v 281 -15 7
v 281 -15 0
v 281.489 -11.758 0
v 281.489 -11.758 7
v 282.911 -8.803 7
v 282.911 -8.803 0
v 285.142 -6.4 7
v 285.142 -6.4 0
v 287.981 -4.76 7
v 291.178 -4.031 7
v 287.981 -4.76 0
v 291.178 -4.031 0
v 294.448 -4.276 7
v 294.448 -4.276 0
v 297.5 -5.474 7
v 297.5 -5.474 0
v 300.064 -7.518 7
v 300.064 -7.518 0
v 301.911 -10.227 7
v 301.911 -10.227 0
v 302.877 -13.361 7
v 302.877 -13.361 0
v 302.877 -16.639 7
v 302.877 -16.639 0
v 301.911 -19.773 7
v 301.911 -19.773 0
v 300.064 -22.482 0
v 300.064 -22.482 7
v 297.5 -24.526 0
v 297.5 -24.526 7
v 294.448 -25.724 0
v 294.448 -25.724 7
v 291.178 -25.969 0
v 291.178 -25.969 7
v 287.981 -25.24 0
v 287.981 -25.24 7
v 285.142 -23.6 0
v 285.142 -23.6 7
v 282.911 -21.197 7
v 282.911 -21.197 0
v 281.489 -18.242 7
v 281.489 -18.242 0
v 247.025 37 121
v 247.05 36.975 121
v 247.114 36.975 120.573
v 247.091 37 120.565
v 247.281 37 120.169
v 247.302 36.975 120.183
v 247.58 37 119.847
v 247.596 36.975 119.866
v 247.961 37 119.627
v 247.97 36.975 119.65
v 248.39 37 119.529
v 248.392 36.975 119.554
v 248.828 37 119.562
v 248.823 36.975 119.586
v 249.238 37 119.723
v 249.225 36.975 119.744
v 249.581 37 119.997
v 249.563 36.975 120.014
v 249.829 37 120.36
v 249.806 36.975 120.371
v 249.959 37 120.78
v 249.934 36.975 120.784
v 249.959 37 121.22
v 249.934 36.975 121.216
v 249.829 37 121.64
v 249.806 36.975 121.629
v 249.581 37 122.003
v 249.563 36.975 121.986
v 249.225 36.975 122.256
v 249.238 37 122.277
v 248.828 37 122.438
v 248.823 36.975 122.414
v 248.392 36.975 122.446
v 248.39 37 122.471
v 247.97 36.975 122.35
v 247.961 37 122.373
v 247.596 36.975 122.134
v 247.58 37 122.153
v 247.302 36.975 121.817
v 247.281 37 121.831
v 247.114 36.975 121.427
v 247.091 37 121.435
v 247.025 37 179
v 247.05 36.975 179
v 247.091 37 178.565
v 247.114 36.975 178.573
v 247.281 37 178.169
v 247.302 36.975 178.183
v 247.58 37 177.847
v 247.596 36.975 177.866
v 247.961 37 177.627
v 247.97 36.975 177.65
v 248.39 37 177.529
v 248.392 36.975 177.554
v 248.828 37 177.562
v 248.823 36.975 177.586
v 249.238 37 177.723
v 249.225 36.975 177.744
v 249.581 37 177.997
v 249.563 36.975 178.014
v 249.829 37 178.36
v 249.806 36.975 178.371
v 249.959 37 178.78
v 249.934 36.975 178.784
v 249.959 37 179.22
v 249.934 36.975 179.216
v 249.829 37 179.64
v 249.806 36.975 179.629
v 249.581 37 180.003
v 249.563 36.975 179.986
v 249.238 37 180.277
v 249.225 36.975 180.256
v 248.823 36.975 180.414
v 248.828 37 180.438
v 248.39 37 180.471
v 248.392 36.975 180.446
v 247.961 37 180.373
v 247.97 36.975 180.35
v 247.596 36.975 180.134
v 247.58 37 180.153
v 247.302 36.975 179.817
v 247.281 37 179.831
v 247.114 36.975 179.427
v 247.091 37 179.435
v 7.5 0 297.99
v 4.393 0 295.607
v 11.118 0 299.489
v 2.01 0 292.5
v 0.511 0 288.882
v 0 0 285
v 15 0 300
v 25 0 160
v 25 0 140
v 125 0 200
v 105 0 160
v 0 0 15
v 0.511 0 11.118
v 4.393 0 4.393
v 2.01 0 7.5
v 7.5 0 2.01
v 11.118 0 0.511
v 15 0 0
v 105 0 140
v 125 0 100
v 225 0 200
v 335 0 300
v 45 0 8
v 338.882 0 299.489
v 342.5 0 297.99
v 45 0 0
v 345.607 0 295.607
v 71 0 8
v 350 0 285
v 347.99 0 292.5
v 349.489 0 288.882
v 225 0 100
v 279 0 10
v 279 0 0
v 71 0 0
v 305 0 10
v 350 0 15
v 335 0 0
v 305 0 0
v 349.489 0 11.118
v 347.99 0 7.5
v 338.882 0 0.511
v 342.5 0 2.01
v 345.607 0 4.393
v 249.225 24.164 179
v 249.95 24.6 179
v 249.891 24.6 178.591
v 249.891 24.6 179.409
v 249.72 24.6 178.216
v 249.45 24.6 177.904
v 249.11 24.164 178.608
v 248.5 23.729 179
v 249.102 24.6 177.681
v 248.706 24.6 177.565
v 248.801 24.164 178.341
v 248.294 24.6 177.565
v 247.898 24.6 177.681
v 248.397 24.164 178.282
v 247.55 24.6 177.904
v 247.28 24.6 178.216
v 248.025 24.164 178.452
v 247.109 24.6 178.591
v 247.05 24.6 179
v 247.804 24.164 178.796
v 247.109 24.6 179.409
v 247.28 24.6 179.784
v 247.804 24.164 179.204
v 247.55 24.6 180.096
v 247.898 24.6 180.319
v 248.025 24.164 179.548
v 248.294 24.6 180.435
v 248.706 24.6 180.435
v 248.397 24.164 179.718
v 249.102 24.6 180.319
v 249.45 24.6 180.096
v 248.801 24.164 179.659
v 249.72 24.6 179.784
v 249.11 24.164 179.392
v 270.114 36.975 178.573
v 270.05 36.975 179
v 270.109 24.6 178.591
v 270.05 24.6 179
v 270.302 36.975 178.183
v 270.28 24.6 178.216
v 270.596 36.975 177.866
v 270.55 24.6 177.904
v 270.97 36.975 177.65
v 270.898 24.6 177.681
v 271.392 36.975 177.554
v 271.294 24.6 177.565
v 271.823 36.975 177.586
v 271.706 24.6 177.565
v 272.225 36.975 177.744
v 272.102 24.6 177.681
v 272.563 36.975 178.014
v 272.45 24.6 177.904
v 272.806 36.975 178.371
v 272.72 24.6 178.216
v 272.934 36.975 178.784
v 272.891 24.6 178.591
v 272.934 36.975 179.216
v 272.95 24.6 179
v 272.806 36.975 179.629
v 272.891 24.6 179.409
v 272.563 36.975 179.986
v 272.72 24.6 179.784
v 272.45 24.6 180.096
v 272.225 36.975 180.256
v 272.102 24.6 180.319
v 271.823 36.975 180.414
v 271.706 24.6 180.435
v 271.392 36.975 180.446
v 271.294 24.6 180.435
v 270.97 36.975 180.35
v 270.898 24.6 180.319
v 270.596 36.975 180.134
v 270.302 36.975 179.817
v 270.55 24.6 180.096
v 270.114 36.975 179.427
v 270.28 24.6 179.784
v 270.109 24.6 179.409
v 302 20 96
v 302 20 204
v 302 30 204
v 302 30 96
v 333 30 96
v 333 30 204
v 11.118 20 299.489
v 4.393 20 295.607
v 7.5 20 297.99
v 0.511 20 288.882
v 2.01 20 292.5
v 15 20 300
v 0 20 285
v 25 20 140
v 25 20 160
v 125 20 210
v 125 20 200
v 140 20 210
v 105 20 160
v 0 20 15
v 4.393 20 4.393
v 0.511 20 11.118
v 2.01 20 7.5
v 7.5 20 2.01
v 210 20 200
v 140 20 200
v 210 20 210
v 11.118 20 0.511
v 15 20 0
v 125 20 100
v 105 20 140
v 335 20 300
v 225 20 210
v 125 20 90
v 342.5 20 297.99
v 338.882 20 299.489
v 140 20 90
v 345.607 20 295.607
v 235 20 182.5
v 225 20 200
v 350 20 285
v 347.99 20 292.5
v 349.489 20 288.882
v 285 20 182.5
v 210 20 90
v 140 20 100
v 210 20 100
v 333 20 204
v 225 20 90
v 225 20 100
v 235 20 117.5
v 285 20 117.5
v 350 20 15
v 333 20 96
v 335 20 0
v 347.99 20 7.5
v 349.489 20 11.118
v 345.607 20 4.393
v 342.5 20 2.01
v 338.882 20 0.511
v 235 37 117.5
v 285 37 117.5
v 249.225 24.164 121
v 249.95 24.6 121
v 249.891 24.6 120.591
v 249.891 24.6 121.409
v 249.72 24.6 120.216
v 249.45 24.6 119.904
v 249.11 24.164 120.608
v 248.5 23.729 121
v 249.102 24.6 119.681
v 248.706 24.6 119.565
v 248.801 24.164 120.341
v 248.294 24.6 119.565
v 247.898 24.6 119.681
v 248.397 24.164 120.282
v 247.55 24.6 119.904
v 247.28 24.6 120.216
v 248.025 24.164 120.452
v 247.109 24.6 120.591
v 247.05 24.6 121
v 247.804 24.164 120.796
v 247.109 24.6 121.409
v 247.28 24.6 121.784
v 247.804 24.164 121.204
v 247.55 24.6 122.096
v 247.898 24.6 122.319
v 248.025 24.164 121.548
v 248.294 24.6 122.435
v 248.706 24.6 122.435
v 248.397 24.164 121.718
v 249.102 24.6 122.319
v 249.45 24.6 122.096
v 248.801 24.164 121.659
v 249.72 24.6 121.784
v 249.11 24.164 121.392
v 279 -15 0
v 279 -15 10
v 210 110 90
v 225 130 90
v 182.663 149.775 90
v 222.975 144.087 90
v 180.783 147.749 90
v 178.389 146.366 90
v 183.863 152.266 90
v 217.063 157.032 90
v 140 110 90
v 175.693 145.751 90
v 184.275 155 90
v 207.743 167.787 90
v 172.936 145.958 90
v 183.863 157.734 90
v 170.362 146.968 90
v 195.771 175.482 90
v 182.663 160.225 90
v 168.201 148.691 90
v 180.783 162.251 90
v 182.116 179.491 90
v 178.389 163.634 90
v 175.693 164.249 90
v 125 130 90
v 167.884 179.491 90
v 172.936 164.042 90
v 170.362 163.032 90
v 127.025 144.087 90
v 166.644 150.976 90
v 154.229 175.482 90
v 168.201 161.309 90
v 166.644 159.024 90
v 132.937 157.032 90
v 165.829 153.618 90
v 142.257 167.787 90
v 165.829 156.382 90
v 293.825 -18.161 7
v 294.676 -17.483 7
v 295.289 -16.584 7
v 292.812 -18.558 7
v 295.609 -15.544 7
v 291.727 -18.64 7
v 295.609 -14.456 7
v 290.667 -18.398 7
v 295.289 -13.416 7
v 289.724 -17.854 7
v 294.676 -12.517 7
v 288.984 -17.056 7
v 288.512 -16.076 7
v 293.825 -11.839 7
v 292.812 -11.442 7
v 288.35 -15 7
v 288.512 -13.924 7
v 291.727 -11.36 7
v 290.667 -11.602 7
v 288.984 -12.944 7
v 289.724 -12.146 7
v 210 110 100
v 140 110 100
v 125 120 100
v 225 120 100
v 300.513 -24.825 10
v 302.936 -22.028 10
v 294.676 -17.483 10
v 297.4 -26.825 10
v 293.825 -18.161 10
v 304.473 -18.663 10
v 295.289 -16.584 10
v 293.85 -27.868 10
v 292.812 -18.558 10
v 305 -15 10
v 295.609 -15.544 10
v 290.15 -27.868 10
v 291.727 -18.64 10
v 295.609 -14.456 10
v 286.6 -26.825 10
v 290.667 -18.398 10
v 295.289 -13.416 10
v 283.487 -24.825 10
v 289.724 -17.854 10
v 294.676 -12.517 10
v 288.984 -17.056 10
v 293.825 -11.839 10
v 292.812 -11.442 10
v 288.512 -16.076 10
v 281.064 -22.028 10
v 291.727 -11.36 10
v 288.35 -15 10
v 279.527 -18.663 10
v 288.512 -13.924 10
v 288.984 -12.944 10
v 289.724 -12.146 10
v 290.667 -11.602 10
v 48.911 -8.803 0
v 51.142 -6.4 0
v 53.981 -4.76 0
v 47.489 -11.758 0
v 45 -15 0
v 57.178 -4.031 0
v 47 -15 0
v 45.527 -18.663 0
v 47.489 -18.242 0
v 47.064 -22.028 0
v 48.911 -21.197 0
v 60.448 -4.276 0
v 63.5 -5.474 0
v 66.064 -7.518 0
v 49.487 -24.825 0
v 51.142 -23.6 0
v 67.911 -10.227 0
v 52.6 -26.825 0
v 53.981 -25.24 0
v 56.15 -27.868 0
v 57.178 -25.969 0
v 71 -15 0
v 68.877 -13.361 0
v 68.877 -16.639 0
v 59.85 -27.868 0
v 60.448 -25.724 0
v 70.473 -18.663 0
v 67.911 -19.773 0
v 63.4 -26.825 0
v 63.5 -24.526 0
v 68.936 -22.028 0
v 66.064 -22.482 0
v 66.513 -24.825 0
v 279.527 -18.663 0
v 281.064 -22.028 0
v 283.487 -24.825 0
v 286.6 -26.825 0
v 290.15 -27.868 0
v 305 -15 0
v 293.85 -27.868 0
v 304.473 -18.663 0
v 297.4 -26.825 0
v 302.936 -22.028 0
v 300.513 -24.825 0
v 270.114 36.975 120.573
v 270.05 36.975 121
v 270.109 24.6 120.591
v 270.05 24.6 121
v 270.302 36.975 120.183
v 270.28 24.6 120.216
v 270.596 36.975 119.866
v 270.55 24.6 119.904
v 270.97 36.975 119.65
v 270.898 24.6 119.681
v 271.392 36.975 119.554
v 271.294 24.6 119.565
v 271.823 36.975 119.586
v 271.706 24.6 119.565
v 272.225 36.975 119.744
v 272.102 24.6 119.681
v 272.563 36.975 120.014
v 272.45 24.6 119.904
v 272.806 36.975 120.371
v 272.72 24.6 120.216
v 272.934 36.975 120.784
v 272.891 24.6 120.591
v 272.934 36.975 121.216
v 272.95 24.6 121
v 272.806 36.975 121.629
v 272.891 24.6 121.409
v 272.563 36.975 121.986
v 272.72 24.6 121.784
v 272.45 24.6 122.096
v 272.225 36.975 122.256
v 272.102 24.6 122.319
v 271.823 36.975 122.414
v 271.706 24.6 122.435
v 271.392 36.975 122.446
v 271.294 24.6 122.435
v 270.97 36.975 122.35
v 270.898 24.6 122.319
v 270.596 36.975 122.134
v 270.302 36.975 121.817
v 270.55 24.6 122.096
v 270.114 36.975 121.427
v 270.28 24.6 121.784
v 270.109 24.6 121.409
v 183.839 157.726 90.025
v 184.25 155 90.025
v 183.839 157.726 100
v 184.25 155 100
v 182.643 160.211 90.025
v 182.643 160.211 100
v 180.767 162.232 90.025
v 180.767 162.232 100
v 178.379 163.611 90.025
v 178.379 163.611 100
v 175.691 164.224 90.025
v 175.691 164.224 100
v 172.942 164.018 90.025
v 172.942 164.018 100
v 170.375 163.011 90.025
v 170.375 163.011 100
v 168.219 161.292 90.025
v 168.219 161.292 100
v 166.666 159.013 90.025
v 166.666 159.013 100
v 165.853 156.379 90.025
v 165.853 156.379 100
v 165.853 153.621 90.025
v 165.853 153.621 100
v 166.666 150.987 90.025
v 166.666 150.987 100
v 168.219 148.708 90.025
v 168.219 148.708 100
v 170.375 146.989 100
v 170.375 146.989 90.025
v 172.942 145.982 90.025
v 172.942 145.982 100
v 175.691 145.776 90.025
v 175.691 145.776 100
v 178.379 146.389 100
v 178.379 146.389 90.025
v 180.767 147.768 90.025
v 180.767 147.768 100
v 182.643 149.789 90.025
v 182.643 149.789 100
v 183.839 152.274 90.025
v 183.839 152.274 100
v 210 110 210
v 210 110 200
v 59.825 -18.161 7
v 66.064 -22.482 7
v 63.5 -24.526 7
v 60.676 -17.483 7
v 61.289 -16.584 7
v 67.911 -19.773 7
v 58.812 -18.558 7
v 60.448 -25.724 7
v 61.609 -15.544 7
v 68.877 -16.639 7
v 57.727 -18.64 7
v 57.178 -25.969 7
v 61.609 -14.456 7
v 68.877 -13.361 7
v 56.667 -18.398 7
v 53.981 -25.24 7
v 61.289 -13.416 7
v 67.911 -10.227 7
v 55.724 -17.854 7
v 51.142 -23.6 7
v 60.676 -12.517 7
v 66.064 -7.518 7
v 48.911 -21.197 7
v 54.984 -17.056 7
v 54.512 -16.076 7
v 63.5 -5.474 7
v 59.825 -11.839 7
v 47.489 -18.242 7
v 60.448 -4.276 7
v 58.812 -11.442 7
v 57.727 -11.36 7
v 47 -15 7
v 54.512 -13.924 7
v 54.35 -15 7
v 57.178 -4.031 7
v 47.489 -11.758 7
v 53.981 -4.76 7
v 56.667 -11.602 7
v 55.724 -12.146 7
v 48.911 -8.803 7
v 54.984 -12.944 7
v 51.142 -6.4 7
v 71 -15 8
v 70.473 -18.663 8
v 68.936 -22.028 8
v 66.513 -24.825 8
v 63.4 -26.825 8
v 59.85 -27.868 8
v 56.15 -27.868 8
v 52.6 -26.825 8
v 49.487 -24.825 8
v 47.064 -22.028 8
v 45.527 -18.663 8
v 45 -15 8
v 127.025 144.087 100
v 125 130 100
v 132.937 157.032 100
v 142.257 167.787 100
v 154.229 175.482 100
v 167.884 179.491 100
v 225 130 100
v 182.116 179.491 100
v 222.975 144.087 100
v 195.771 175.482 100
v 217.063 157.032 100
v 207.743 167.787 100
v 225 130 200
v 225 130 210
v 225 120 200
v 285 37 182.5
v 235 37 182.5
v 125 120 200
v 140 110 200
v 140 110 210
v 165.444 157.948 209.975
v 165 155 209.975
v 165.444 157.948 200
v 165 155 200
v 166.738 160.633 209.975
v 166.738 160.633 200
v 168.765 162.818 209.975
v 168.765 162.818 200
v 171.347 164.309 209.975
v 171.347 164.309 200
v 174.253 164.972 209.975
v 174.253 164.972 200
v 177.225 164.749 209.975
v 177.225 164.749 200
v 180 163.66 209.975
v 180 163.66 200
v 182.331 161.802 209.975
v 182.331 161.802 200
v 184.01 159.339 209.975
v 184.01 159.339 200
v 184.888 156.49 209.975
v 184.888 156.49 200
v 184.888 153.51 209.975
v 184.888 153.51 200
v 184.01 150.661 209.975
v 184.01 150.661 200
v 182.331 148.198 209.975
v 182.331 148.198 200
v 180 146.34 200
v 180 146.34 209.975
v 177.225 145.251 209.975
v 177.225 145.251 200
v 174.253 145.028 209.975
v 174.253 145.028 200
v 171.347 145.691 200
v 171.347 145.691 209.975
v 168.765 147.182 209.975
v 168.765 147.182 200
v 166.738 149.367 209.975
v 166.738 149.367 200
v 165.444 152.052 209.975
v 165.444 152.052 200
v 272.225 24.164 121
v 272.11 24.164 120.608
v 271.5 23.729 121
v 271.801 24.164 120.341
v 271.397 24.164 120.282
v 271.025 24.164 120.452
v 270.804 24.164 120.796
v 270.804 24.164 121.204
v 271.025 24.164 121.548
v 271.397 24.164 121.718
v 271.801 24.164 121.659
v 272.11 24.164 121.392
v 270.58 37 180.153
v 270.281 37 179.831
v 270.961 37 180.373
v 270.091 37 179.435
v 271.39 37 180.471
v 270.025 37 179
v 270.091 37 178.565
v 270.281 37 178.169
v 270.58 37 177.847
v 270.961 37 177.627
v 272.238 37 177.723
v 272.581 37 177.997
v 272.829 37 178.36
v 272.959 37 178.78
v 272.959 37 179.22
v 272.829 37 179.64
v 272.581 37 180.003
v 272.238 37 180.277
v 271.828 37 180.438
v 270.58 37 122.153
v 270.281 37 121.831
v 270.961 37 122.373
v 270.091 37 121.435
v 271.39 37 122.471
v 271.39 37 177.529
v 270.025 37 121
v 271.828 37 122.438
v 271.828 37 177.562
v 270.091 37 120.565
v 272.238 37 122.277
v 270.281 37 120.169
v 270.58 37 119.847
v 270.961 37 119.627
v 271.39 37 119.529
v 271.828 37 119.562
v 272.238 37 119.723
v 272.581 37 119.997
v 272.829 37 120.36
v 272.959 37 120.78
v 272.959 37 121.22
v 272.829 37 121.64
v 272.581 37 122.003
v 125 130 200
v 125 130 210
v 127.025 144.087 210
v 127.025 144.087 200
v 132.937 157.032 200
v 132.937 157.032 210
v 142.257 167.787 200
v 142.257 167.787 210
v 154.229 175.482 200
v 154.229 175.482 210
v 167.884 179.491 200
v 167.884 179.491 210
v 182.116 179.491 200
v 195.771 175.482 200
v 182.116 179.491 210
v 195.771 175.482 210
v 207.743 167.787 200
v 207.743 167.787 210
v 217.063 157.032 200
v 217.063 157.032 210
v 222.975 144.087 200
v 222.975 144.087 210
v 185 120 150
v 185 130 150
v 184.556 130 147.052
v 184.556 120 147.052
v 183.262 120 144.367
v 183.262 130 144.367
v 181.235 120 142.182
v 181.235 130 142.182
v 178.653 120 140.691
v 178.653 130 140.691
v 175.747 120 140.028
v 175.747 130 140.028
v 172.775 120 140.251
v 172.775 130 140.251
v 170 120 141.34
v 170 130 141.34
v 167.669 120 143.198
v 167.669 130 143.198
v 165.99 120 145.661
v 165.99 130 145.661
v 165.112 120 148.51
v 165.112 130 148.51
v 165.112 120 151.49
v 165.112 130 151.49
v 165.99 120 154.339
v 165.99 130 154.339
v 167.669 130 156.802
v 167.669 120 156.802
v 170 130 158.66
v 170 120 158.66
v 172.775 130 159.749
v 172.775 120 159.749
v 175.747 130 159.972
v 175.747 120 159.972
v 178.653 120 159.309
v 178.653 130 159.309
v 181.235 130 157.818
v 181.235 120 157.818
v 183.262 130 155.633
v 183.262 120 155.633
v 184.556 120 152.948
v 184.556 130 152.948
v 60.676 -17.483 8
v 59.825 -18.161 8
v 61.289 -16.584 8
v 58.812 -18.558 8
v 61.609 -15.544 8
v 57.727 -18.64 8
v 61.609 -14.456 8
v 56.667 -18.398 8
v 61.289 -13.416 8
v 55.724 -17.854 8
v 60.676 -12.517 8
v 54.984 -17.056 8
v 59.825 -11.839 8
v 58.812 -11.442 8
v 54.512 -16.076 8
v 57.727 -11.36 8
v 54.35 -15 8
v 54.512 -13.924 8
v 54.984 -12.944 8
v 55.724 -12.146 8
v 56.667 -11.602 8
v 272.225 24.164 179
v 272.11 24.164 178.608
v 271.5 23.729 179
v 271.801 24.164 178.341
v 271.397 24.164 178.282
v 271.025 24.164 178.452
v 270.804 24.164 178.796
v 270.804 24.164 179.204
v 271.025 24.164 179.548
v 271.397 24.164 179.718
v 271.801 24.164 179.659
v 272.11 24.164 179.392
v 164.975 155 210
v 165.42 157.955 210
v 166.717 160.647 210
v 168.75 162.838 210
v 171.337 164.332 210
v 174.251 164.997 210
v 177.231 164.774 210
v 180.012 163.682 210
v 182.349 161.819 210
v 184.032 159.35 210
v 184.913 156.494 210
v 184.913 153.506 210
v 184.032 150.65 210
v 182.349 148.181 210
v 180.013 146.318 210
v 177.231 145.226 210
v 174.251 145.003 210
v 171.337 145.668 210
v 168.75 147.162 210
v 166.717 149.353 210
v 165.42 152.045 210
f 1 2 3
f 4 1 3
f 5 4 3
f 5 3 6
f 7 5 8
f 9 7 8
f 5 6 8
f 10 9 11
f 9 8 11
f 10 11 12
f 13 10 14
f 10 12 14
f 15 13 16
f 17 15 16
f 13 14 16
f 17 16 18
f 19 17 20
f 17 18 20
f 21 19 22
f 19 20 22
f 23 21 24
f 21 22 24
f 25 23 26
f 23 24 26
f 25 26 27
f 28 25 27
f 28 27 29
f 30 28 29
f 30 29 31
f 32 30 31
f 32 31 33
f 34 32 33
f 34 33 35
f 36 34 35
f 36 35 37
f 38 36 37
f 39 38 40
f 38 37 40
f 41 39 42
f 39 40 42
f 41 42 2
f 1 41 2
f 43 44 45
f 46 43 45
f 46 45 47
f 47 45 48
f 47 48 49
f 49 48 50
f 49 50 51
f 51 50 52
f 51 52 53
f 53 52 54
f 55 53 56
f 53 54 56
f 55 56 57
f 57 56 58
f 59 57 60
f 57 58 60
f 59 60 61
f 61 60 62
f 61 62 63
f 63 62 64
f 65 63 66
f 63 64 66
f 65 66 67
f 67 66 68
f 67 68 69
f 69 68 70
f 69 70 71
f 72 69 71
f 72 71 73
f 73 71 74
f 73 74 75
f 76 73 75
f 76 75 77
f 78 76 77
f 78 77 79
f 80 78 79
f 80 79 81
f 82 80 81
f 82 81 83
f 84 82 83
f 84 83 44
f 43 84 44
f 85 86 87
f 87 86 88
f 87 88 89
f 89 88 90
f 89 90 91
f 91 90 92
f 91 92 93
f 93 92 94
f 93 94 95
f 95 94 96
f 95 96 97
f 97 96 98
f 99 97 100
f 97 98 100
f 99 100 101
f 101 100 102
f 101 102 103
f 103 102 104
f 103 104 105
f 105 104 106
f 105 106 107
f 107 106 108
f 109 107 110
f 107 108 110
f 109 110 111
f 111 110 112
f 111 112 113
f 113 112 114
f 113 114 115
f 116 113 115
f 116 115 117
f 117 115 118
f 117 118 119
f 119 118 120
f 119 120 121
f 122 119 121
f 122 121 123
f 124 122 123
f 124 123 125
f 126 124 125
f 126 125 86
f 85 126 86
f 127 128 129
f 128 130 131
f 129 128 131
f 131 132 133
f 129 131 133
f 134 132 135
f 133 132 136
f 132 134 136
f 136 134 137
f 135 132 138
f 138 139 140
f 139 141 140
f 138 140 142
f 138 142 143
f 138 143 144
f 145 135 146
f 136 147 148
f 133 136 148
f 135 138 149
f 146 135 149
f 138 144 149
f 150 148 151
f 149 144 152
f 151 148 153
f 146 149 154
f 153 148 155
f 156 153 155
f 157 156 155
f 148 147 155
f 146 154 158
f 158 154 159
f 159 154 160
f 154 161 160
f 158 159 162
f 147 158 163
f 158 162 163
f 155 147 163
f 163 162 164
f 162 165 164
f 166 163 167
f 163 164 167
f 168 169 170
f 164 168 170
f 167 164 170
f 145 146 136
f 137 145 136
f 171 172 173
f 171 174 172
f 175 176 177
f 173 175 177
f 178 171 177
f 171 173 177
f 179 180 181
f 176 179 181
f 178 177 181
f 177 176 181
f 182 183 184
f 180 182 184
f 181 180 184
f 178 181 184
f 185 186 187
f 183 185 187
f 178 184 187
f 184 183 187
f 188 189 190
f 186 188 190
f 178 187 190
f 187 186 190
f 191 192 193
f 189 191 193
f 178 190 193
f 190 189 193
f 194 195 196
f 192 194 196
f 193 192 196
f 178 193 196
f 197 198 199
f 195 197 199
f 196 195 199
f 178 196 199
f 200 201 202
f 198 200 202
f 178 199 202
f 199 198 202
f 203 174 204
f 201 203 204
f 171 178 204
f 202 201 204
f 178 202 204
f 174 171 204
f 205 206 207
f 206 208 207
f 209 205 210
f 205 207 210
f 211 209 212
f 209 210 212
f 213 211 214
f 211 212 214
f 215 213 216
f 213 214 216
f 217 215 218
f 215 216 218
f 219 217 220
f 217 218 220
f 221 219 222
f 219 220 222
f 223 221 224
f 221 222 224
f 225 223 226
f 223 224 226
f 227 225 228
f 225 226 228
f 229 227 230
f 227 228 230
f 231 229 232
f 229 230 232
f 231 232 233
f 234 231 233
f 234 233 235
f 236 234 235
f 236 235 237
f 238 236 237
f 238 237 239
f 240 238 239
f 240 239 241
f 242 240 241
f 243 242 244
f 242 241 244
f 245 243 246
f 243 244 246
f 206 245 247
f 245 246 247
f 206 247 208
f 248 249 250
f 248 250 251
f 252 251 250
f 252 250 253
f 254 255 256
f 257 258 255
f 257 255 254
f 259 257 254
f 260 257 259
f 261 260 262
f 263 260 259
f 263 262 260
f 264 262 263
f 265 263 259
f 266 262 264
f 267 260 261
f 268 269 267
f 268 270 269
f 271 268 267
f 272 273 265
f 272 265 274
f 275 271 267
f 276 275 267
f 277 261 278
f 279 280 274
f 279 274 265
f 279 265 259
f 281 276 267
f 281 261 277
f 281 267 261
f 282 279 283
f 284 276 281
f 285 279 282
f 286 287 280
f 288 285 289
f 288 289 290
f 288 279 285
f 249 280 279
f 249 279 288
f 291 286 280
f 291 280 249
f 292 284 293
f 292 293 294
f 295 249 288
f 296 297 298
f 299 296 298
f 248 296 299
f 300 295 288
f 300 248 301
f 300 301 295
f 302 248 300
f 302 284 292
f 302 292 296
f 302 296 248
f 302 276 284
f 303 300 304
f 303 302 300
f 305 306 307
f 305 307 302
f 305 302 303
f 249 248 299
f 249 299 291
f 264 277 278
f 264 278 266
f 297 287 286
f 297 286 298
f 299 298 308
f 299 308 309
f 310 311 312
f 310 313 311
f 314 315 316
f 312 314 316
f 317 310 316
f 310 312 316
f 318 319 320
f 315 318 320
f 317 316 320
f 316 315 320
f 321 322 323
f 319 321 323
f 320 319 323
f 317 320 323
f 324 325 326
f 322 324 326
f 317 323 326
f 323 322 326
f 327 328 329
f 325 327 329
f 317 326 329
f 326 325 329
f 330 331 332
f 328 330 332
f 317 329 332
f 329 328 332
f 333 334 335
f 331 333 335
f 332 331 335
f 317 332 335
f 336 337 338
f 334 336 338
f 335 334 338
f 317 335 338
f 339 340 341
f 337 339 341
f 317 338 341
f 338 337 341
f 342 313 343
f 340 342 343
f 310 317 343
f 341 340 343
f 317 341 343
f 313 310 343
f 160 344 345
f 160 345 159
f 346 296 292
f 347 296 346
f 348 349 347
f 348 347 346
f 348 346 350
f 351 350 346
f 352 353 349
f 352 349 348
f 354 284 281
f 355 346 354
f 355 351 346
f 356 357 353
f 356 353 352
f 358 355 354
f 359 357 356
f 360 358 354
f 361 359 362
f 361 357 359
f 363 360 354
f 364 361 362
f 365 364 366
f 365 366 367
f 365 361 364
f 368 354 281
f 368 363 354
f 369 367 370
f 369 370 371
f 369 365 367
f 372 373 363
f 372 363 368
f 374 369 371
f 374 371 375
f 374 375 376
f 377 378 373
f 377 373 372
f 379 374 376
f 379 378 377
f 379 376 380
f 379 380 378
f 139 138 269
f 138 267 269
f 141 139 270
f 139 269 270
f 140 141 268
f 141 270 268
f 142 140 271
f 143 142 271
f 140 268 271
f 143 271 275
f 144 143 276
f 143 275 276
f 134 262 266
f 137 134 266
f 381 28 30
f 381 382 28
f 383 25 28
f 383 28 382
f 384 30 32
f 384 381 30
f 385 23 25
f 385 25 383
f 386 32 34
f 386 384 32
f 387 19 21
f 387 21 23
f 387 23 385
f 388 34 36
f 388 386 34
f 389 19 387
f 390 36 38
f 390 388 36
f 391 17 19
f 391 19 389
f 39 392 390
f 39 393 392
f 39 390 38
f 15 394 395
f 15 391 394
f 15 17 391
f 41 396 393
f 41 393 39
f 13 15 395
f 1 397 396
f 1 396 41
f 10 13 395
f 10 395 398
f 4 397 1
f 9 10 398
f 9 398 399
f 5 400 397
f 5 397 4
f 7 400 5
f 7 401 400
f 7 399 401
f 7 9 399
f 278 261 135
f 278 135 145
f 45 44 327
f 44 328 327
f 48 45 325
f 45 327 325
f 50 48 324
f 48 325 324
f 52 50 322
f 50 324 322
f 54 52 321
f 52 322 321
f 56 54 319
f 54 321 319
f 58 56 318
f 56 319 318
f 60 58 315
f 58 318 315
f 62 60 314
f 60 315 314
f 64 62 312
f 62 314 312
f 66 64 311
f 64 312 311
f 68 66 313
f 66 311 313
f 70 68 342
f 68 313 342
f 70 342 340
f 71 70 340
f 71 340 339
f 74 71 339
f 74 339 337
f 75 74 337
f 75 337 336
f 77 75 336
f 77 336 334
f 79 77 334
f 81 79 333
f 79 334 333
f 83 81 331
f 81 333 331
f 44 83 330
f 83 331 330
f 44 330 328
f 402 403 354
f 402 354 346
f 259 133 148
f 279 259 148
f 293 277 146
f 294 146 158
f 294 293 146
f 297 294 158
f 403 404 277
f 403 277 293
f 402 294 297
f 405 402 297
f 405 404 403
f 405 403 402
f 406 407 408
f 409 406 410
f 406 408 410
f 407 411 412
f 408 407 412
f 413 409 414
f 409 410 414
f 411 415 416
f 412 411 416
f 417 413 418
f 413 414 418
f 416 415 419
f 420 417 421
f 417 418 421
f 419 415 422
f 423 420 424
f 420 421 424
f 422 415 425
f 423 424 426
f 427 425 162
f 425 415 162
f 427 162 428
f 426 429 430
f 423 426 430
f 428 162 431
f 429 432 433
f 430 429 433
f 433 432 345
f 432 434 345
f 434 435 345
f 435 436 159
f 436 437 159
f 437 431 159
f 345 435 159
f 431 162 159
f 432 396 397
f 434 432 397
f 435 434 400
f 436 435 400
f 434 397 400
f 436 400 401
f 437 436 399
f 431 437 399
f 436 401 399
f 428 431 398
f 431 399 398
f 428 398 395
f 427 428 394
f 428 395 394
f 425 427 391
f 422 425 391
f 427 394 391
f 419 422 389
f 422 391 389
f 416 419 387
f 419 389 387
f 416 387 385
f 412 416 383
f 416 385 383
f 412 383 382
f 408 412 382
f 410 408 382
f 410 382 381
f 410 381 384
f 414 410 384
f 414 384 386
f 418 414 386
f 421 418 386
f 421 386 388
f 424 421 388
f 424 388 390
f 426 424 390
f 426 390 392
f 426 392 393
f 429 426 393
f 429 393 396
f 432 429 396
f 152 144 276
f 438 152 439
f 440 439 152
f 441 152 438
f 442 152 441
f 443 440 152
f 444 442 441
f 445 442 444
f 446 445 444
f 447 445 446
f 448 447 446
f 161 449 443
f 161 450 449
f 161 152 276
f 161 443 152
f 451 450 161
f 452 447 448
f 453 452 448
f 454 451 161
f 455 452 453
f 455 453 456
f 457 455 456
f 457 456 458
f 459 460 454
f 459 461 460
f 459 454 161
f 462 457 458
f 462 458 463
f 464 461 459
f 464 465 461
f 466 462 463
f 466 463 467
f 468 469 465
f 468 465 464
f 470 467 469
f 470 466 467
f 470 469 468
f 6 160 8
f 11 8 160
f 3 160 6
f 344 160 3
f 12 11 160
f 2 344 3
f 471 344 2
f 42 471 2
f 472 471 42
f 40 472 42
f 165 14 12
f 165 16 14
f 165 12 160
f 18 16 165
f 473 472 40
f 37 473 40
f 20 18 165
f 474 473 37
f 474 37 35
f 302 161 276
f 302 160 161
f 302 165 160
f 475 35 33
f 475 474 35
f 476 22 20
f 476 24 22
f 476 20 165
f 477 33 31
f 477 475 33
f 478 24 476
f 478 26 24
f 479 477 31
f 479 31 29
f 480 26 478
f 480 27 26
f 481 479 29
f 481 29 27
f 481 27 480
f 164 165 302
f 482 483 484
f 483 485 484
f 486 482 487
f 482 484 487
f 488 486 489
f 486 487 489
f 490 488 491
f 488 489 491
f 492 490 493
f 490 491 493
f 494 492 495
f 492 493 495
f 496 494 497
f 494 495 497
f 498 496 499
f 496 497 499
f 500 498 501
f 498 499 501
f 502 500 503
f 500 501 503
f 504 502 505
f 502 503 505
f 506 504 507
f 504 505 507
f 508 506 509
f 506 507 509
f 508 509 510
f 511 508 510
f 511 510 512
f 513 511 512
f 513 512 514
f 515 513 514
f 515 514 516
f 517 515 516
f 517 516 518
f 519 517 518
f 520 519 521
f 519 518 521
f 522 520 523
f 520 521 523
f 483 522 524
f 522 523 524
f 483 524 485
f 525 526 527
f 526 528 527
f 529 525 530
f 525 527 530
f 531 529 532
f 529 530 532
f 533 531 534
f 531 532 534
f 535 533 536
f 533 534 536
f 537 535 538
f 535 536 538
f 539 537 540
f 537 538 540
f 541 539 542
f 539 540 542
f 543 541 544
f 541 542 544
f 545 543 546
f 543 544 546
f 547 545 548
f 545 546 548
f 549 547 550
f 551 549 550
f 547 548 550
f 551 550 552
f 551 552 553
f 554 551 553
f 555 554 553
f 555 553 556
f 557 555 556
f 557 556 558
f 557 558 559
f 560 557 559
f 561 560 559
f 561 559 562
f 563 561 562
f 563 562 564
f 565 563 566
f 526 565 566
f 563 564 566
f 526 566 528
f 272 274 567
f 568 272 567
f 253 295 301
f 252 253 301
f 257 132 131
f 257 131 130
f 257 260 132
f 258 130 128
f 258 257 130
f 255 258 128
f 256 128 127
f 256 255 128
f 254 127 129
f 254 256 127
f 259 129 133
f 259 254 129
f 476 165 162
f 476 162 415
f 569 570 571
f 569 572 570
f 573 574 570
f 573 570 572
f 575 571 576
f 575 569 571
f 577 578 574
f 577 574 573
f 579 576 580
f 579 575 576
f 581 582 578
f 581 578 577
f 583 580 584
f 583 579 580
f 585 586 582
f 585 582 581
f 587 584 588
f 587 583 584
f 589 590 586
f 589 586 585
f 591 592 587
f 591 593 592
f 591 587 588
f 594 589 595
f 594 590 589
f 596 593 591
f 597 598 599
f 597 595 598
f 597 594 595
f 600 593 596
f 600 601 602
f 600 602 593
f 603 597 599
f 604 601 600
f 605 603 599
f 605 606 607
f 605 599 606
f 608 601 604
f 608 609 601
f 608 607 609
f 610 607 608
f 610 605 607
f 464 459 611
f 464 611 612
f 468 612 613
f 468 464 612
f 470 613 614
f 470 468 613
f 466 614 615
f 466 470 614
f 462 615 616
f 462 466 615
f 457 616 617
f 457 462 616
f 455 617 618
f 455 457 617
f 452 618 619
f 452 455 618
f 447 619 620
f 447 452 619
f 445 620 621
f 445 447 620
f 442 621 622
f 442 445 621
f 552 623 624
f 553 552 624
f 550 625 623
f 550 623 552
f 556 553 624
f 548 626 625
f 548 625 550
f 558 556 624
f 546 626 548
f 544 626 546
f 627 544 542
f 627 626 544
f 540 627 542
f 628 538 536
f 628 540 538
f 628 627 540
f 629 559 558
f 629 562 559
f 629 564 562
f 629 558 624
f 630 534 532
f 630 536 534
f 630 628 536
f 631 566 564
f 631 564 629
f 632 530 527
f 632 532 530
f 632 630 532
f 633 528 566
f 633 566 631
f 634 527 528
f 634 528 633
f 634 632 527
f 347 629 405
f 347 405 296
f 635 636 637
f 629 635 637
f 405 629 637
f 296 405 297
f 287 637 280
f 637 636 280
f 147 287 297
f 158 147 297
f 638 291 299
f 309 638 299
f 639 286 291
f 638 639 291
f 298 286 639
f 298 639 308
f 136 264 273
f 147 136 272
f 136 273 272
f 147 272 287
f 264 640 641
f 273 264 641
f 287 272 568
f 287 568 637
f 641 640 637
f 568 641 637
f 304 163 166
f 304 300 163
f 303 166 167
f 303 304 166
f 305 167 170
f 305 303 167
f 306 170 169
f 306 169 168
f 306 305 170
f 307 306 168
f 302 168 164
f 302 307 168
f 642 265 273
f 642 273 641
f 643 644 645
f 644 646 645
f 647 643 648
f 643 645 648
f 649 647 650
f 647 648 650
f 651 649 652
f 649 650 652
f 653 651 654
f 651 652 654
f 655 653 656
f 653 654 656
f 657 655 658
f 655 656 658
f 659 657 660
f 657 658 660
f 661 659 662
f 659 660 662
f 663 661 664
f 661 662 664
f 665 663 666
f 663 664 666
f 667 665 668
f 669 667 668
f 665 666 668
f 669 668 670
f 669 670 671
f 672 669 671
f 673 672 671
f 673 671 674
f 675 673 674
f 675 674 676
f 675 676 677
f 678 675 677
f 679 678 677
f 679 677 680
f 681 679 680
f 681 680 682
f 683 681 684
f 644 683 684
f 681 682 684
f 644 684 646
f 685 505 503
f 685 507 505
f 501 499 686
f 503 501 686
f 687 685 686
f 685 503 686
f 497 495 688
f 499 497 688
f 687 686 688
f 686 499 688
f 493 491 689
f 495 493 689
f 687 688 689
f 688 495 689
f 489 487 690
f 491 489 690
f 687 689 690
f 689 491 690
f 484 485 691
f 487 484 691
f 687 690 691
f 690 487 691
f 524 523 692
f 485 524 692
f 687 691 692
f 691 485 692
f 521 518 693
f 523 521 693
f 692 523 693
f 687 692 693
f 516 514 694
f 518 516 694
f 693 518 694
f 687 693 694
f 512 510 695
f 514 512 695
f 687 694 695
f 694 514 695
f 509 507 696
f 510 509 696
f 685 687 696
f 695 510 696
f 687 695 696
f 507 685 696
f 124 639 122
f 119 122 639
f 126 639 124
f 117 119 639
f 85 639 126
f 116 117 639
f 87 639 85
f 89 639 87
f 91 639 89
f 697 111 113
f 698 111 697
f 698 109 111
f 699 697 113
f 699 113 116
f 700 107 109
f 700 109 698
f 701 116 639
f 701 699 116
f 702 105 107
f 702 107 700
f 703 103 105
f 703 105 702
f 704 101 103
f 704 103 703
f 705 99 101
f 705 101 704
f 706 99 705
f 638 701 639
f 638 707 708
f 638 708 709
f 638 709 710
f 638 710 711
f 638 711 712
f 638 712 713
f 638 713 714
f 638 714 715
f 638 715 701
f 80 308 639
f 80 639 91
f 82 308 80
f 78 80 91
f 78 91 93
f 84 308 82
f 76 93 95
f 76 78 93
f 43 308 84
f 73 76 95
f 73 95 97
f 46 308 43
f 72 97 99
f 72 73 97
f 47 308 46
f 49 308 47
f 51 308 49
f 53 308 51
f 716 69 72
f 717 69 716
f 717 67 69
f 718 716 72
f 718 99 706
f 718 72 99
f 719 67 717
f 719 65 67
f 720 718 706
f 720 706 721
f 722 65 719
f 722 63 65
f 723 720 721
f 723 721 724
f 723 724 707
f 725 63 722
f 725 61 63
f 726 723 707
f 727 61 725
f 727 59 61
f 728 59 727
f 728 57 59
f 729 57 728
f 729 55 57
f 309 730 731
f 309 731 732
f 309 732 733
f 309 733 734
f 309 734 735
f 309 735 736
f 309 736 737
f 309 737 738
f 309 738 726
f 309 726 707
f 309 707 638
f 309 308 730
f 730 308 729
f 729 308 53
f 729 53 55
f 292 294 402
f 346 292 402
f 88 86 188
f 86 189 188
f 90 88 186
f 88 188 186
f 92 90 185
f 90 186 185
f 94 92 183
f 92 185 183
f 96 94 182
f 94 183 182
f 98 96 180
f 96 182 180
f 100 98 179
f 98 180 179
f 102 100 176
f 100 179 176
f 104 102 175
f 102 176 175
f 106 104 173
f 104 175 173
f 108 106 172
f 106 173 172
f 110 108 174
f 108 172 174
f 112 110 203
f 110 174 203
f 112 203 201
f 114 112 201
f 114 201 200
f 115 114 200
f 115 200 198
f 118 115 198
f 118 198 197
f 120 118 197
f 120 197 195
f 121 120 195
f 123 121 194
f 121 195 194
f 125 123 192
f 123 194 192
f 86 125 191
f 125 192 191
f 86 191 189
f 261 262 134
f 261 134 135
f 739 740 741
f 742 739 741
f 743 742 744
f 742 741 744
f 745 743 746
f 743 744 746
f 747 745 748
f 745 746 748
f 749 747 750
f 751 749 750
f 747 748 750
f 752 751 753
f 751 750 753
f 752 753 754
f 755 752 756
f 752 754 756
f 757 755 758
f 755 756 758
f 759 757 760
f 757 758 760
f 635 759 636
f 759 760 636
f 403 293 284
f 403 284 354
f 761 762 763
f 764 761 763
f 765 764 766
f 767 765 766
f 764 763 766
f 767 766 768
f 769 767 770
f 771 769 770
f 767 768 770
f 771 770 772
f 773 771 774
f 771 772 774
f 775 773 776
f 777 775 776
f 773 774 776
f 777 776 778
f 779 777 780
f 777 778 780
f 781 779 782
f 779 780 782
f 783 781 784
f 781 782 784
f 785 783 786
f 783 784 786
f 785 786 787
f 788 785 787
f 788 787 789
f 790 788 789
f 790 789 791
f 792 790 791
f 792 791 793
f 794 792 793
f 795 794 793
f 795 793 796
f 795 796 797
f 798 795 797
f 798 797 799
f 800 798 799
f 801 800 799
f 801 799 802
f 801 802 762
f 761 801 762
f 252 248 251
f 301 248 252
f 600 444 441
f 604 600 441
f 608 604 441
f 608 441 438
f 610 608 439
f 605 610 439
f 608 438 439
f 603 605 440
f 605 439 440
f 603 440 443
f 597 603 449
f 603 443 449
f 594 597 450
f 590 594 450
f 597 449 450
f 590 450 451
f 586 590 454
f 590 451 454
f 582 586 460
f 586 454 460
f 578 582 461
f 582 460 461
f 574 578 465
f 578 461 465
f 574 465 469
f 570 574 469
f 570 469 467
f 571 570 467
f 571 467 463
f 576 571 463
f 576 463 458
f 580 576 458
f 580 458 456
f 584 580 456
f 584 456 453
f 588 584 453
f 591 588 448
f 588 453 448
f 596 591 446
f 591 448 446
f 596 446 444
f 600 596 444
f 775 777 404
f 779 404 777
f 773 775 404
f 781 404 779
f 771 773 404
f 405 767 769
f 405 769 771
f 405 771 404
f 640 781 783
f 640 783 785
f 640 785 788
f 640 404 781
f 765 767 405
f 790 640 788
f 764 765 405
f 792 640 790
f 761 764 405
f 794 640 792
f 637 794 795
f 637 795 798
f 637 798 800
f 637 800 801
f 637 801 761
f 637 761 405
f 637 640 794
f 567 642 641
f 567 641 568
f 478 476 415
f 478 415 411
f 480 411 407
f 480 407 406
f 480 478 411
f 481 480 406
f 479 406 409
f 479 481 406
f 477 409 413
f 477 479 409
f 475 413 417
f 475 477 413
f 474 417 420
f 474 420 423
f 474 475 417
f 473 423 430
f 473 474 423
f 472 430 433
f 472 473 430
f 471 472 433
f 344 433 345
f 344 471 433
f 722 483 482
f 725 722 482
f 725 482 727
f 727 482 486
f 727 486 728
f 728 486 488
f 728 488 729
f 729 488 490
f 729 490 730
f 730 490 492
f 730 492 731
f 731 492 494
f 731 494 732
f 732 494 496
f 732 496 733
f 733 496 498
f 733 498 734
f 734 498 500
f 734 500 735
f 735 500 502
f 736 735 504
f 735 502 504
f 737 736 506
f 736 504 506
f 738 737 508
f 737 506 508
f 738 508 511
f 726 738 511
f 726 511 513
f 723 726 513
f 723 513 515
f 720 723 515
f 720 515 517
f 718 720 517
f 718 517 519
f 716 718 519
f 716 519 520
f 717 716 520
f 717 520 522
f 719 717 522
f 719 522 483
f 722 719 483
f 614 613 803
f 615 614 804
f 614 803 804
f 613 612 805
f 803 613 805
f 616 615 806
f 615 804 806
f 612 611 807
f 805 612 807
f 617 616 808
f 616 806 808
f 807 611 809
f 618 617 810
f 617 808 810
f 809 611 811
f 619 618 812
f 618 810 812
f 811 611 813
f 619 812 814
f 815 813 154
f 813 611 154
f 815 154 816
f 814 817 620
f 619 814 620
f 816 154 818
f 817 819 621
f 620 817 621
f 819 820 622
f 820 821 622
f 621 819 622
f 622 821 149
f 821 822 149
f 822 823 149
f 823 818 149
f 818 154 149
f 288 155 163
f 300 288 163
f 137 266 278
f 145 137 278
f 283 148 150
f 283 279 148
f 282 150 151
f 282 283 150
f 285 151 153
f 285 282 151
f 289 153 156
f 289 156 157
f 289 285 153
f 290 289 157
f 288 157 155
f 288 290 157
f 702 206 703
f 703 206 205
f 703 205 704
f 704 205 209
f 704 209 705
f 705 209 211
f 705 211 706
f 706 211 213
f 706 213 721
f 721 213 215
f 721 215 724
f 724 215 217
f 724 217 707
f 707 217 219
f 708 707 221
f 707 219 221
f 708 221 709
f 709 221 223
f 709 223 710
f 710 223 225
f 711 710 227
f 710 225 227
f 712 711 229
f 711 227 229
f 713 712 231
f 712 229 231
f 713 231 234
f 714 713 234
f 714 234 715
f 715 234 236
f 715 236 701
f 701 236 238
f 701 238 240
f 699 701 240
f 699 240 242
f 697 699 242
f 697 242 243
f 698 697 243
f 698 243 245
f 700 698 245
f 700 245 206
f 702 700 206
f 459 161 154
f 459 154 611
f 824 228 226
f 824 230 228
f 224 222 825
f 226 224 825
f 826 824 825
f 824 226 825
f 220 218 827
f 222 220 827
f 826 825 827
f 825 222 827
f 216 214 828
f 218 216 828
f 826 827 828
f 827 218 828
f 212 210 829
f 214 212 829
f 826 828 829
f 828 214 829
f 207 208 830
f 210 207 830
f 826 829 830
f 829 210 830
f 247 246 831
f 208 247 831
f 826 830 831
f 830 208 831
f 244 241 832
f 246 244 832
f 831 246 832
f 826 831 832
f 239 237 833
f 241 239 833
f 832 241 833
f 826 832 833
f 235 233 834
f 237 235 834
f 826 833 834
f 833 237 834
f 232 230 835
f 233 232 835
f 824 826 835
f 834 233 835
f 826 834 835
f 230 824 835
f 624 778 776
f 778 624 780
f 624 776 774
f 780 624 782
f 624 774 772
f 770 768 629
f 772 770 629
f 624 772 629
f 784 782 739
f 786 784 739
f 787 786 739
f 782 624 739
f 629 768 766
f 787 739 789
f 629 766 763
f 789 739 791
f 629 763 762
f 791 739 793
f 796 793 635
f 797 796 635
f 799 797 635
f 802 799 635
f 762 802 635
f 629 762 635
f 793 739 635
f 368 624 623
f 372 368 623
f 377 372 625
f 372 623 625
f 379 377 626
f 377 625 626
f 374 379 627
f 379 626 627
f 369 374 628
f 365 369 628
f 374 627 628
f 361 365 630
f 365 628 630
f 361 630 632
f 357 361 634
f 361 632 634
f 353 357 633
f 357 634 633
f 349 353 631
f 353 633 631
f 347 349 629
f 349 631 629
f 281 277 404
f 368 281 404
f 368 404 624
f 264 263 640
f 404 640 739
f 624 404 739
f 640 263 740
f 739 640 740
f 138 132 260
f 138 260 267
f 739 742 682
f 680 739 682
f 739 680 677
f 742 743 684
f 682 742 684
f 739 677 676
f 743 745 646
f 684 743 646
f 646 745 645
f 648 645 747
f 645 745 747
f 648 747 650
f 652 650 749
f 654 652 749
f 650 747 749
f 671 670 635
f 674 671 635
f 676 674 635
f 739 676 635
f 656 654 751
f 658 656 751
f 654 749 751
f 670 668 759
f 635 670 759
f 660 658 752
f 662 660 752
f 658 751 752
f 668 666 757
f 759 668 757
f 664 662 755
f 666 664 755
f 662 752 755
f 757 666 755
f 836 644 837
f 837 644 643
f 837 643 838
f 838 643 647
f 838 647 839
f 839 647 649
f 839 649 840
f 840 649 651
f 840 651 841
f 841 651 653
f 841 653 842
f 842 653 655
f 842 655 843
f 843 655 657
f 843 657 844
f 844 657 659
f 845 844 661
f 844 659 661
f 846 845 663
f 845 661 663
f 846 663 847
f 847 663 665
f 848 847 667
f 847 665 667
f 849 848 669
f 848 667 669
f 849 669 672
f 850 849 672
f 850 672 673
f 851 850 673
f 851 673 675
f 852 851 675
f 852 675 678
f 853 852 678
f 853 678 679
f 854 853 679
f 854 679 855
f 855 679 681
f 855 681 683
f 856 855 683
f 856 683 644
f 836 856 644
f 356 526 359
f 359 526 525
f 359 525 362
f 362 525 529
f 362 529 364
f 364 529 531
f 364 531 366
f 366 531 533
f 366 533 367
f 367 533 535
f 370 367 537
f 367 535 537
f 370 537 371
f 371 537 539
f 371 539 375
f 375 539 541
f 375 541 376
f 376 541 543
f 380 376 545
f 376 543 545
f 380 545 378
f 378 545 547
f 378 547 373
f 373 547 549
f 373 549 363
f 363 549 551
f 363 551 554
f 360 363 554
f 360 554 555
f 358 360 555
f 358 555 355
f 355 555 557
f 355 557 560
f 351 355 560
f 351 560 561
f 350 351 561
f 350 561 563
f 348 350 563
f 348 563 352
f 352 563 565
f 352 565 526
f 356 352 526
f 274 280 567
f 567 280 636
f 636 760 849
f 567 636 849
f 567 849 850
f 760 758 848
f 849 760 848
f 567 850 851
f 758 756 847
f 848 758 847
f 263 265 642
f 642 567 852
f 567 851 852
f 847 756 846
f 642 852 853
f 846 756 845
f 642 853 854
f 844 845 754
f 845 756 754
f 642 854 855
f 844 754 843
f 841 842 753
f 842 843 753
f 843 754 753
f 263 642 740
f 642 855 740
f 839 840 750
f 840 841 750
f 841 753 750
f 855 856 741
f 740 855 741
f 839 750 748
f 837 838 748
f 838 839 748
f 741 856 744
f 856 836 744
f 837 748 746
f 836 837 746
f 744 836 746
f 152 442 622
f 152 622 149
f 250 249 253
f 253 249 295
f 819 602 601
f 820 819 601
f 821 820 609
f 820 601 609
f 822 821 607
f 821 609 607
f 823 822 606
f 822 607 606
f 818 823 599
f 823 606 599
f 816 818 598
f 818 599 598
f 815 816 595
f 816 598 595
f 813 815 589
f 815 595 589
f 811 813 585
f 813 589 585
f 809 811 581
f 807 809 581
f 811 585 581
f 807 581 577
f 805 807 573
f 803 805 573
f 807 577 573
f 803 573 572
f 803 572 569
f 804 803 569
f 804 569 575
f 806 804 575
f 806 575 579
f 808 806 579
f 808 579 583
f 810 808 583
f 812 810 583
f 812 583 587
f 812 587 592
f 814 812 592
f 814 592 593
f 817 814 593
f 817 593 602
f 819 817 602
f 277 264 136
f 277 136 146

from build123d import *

# Parameters (mm, degrees)
SKETCH1_W                              = 350
SKETCH1_H                              = 300
BOSS_EXTRUDE1_DEPTH                    = 20
FILLET1_R                              = 15
SKETCH2_W                              = 100
SKETCH2_H                              = 100
CUT_EXTRUDE1_DEPTH                     = 20
BOSS_EXTRUDE2_DEPTH                    = 10
LPATTERN1_COUNT                        = 2
LPATTERN1_PITCH                        = 110
F_20_0_20_DIAMETER_HOLE2_D             = 20
F_20_0_20_DIAMETER_HOLE2_DEPTH         = 10
F_20_0_20_DIAMETER_HOLE2_CSINK_D       = 20.05
F_20_0_20_DIAMETER_HOLE2_CSINK_ANGLE   = 90
F_20_0_20_DIAMETER_HOLE2_TIP           = 6.00860619
F_18_5_18_5_DIAMETER_HOLE1_D           = 18.5
F_18_5_18_5_DIAMETER_HOLE1_DEPTH       = 10
F_18_5_18_5_DIAMETER_HOLE1_CSINK_D     = 18.55
F_18_5_18_5_DIAMETER_HOLE1_CSINK_ANGLE = 90
F_18_5_18_5_DIAMETER_HOLE1_TIP         = 5.557960726
SKETCH32_W                             = 100
SKETCH32_H                             = 10
BOSS_EXTRUDE3_DEPTH                    = 120
SKETCH37_R                             = 10
CUT_EXTRUDE2_DEPTH                     = 36.07831716
SKETCH45_W                             = 30
SKETCH45_H                             = 65
BOSS_EXTRUDE4_DEPTH                    = 17
M2_5_CLEARANCE_HOLE1_D                 = 2.9
M2_5_CLEARANCE_HOLE1_DEPTH             = 12.4
M2_5_CLEARANCE_HOLE1_CSINK_D           = 2.95
M2_5_CLEARANCE_HOLE1_CSINK_ANGLE       = 90
M2_5_CLEARANCE_HOLE1_TIP               = 0.871247898
SKETCH54_W                             = 10
SKETCH54_H                             = 65
BOSS_EXTRUDE5_DEPTH                    = 17
SKETCH55_W                             = 31
SKETCH55_H                             = 108
BOSS_EXTRUDE6_DEPTH                    = 10
SKETCH59_W                             = 80
SKETCH59_H                             = 20
CUT_EXTRUDE3_DEPTH                     = 21
SKETCH60_W                             = 70
SKETCH60_H                             = 90
CUT_EXTRUDE4_DEPTH                     = 180
SKETCH64_R                             = 3.65
BOSS_EXTRUDE7_DEPTH                    = 10
SKETCH70_R                             = 11
CUT_EXTRUDE5_DEPTH                     = 7
SKETCH75_R                             = 13
SKETCH75_R_2                           = 11
SKETCH75_R_3                           = 3.65
BOSS_EXTRUDE8_DEPTH                    = 8
SKETCH77_R                             = 11
CUT_EXTRUDE6_DEPTH                     = 7


with BuildPart() as part:
    # Sketch1 → Boss-Extrude1 (new body)
    with BuildSketch(Plane(origin=(0, 0, 0), x_dir=(1, 0, 0), z_dir=(0, 1, 0))):
        with Locations((175, -150)):
            Rectangle(SKETCH1_W, SKETCH1_H)
    extrude(amount=BOSS_EXTRUDE1_DEPTH)

    # Fillet1
    fillet1_edges = [part.edges().sort_by_distance(p)[0] for p in [
        (0, 10, 0),
        (350, 10, 0),
        (350, 10, 300),
        (0, 10, 300),
    ]]
    fillet(fillet1_edges, radius=FILLET1_R)

    # Sketch2 → Cut-Extrude1 (cut)
    with BuildSketch(Plane(origin=(0, 20, 0), x_dir=(1, 0, 0), z_dir=(0, 1, 0))):
        with Locations((175, -150)):
            Rectangle(SKETCH2_W, SKETCH2_H)
    extrude(amount=-CUT_EXTRUDE1_DEPTH, mode=Mode.SUBTRACT)

    # Sketch6 → Boss-Extrude2 (add)
    with BuildSketch(Plane.XY.offset(100)):
        with BuildLine():
            Line((125, 0), (125, 130))
            ThreePointArc((125, 130), (175, 180), (225, 130))
            Line((225, 130), (225, 0))
            Line((225, 0), (125, 0))
        make_face()
    boss_extrude2 = extrude(amount=-BOSS_EXTRUDE2_DEPTH)

    # LPattern1: Boss-Extrude2 ×2
    with Locations(*[(0, 0, i * LPATTERN1_PITCH) for i in range(1, LPATTERN1_COUNT)]):
        add(boss_extrude2)

    # Ø20.0 (20) Diameter Hole2
    with Locations(Plane.XY.offset(210)):
        with Locations((175, 155)):
            CounterSinkHole(F_20_0_20_DIAMETER_HOLE2_D / 2, F_20_0_20_DIAMETER_HOLE2_CSINK_D / 2, depth=F_20_0_20_DIAMETER_HOLE2_DEPTH, counter_sink_angle=F_20_0_20_DIAMETER_HOLE2_CSINK_ANGLE)
            with Locations((0, 0, -(F_20_0_20_DIAMETER_HOLE2_DEPTH + F_20_0_20_DIAMETER_HOLE2_TIP / 2))):  # 118° drill point
                Cone(0, F_20_0_20_DIAMETER_HOLE2_D / 2, F_20_0_20_DIAMETER_HOLE2_TIP, mode=Mode.SUBTRACT)

    # Ø18.5 (18.5) Diameter Hole1
    with Locations(Plane(origin=(0, 0, 90), x_dir=(-1, 0, 0), z_dir=(0, 0, -1))):
        with Locations((-175, 155)):
            CounterSinkHole(F_18_5_18_5_DIAMETER_HOLE1_D / 2, F_18_5_18_5_DIAMETER_HOLE1_CSINK_D / 2, depth=F_18_5_18_5_DIAMETER_HOLE1_DEPTH, counter_sink_angle=F_18_5_18_5_DIAMETER_HOLE1_CSINK_ANGLE)
            with Locations((0, 0, -(F_18_5_18_5_DIAMETER_HOLE1_DEPTH + F_18_5_18_5_DIAMETER_HOLE1_TIP / 2))):  # 118° drill point
                Cone(0, F_18_5_18_5_DIAMETER_HOLE1_D / 2, F_18_5_18_5_DIAMETER_HOLE1_TIP, mode=Mode.SUBTRACT)

    # Sketch32 → Boss-Extrude3 (add)
    with BuildSketch(Plane.XY.offset(210)):
        with Locations((175, 125)):
            Rectangle(SKETCH32_W, SKETCH32_H)
    extrude(amount=-BOSS_EXTRUDE3_DEPTH)

    # Sketch37 → Cut-Extrude2 (cut)
    with BuildSketch(Plane(origin=(0, 130, 0), x_dir=(1, 0, 0), z_dir=(0, 1, 0))):
        with Locations((175, -150)):
            Circle(SKETCH37_R)
    extrude(amount=-CUT_EXTRUDE2_DEPTH, mode=Mode.SUBTRACT)

    # Sketch45 → Boss-Extrude4 (add)
    with BuildSketch(Plane(origin=(0, 20, 0), x_dir=(1, 0, 0), z_dir=(0, 1, 0))):
        with Locations((260, -150)):
            Rectangle(SKETCH45_W, SKETCH45_H)
    extrude(amount=BOSS_EXTRUDE4_DEPTH)

    # M2.5 Clearance Hole1
    with Locations(Plane(origin=(0, 37, 0), x_dir=(1, 0, 0), z_dir=(0, 1, 0))):
        with Locations((248.5, -121), (271.5, -121), (271.5, -179), (248.5, -179)):
            CounterSinkHole(M2_5_CLEARANCE_HOLE1_D / 2, M2_5_CLEARANCE_HOLE1_CSINK_D / 2, depth=M2_5_CLEARANCE_HOLE1_DEPTH, counter_sink_angle=M2_5_CLEARANCE_HOLE1_CSINK_ANGLE)
            with Locations((0, 0, -(M2_5_CLEARANCE_HOLE1_DEPTH + M2_5_CLEARANCE_HOLE1_TIP / 2))):  # 118° drill point
                Cone(0, M2_5_CLEARANCE_HOLE1_D / 2, M2_5_CLEARANCE_HOLE1_TIP, mode=Mode.SUBTRACT)

    # Sketch54 → Boss-Extrude5 (add)
    with BuildSketch(Plane(origin=(0, 20, 0), x_dir=(1, 0, 0), z_dir=(0, 1, 0))):
        with Locations((280, -150)):
            Rectangle(SKETCH54_W, SKETCH54_H)
        with Locations((240, -150)):
            Rectangle(SKETCH54_W, SKETCH54_H)
    extrude(amount=BOSS_EXTRUDE5_DEPTH)

    # Sketch55 → Boss-Extrude6 (add)
    with BuildSketch(Plane(origin=(0, 20, 0), x_dir=(1, 0, 0), z_dir=(0, 1, 0))):
        with Locations((317.5, -150)):
            Rectangle(SKETCH55_W, SKETCH55_H)
    extrude(amount=BOSS_EXTRUDE6_DEPTH)

    # Sketch59 → Cut-Extrude3 (cut, through all)
    with BuildSketch(Plane(origin=(0, 20, 0), x_dir=(1, 0, 0), z_dir=(0, 1, 0))):
        with Locations((65, -150)):
            Rectangle(SKETCH59_W, SKETCH59_H)
    extrude(amount=-CUT_EXTRUDE3_DEPTH, mode=Mode.SUBTRACT)

    # Sketch60 → Cut-Extrude4 (cut)
    with BuildSketch(Plane.XY.offset(210)):
        with Locations((175, 65)):
            Rectangle(SKETCH60_W, SKETCH60_H)
    extrude(amount=-CUT_EXTRUDE4_DEPTH, mode=Mode.SUBTRACT)

    # Sketch64 → Boss-Extrude7 (add)
    with BuildSketch(Plane(origin=(0, 0, 0), x_dir=(-1, 0, 0), z_dir=(0, 0, -1))):
        with BuildLine():
            Line((-305, 0), (-305, -15))
            ThreePointArc((-305, -15), (-292, -28), (-279, -15))
            Line((-279, -15), (-279, 0))
            Line((-279, 0), (-305, 0))
        make_face()
        with Locations((-292, -15)):
            Circle(SKETCH64_R, mode=Mode.SUBTRACT)
    extrude(amount=-BOSS_EXTRUDE7_DEPTH)

    # Sketch70 → Cut-Extrude5 (cut)
    with BuildSketch(Plane(origin=(0, 0, 0), x_dir=(-1, 0, 0), z_dir=(0, 0, -1))):
        with Locations((-292, -15)):
            Circle(SKETCH70_R)
    extrude(amount=-CUT_EXTRUDE5_DEPTH, mode=Mode.SUBTRACT)

    # Sketch75 → Boss-Extrude8 (add)
    with BuildSketch(Plane(origin=(0, 0, 0), x_dir=(-1, 0, 0), z_dir=(0, 0, -1))):
        with Locations((-58, -15)):
            Circle(SKETCH75_R)
        with Locations((-58, -15)):
            Circle(SKETCH75_R_2, mode=Mode.SUBTRACT)
        with Locations((-58, -15)):
            Circle(SKETCH75_R_2)
        with Locations((-58, -15)):
            Circle(SKETCH75_R_3, mode=Mode.SUBTRACT)
        with BuildLine():
            Line((-71, 0), (-71, -15))
            ThreePointArc((-71, -15), (-58, -2), (-45, -15))
            Line((-45, -15), (-45, 0))
            Line((-45, 0), (-71, 0))
        make_face()
    extrude(amount=-BOSS_EXTRUDE8_DEPTH)

    # Sketch77 → Cut-Extrude6 (cut)
    with BuildSketch(Plane(origin=(0, 0, 0), x_dir=(-1, 0, 0), z_dir=(0, 0, -1))):
        with Locations((-58, -15)):
            Circle(SKETCH77_R)
    extrude(amount=-CUT_EXTRUDE6_DEPTH, mode=Mode.SUBTRACT)


solid = part.part
